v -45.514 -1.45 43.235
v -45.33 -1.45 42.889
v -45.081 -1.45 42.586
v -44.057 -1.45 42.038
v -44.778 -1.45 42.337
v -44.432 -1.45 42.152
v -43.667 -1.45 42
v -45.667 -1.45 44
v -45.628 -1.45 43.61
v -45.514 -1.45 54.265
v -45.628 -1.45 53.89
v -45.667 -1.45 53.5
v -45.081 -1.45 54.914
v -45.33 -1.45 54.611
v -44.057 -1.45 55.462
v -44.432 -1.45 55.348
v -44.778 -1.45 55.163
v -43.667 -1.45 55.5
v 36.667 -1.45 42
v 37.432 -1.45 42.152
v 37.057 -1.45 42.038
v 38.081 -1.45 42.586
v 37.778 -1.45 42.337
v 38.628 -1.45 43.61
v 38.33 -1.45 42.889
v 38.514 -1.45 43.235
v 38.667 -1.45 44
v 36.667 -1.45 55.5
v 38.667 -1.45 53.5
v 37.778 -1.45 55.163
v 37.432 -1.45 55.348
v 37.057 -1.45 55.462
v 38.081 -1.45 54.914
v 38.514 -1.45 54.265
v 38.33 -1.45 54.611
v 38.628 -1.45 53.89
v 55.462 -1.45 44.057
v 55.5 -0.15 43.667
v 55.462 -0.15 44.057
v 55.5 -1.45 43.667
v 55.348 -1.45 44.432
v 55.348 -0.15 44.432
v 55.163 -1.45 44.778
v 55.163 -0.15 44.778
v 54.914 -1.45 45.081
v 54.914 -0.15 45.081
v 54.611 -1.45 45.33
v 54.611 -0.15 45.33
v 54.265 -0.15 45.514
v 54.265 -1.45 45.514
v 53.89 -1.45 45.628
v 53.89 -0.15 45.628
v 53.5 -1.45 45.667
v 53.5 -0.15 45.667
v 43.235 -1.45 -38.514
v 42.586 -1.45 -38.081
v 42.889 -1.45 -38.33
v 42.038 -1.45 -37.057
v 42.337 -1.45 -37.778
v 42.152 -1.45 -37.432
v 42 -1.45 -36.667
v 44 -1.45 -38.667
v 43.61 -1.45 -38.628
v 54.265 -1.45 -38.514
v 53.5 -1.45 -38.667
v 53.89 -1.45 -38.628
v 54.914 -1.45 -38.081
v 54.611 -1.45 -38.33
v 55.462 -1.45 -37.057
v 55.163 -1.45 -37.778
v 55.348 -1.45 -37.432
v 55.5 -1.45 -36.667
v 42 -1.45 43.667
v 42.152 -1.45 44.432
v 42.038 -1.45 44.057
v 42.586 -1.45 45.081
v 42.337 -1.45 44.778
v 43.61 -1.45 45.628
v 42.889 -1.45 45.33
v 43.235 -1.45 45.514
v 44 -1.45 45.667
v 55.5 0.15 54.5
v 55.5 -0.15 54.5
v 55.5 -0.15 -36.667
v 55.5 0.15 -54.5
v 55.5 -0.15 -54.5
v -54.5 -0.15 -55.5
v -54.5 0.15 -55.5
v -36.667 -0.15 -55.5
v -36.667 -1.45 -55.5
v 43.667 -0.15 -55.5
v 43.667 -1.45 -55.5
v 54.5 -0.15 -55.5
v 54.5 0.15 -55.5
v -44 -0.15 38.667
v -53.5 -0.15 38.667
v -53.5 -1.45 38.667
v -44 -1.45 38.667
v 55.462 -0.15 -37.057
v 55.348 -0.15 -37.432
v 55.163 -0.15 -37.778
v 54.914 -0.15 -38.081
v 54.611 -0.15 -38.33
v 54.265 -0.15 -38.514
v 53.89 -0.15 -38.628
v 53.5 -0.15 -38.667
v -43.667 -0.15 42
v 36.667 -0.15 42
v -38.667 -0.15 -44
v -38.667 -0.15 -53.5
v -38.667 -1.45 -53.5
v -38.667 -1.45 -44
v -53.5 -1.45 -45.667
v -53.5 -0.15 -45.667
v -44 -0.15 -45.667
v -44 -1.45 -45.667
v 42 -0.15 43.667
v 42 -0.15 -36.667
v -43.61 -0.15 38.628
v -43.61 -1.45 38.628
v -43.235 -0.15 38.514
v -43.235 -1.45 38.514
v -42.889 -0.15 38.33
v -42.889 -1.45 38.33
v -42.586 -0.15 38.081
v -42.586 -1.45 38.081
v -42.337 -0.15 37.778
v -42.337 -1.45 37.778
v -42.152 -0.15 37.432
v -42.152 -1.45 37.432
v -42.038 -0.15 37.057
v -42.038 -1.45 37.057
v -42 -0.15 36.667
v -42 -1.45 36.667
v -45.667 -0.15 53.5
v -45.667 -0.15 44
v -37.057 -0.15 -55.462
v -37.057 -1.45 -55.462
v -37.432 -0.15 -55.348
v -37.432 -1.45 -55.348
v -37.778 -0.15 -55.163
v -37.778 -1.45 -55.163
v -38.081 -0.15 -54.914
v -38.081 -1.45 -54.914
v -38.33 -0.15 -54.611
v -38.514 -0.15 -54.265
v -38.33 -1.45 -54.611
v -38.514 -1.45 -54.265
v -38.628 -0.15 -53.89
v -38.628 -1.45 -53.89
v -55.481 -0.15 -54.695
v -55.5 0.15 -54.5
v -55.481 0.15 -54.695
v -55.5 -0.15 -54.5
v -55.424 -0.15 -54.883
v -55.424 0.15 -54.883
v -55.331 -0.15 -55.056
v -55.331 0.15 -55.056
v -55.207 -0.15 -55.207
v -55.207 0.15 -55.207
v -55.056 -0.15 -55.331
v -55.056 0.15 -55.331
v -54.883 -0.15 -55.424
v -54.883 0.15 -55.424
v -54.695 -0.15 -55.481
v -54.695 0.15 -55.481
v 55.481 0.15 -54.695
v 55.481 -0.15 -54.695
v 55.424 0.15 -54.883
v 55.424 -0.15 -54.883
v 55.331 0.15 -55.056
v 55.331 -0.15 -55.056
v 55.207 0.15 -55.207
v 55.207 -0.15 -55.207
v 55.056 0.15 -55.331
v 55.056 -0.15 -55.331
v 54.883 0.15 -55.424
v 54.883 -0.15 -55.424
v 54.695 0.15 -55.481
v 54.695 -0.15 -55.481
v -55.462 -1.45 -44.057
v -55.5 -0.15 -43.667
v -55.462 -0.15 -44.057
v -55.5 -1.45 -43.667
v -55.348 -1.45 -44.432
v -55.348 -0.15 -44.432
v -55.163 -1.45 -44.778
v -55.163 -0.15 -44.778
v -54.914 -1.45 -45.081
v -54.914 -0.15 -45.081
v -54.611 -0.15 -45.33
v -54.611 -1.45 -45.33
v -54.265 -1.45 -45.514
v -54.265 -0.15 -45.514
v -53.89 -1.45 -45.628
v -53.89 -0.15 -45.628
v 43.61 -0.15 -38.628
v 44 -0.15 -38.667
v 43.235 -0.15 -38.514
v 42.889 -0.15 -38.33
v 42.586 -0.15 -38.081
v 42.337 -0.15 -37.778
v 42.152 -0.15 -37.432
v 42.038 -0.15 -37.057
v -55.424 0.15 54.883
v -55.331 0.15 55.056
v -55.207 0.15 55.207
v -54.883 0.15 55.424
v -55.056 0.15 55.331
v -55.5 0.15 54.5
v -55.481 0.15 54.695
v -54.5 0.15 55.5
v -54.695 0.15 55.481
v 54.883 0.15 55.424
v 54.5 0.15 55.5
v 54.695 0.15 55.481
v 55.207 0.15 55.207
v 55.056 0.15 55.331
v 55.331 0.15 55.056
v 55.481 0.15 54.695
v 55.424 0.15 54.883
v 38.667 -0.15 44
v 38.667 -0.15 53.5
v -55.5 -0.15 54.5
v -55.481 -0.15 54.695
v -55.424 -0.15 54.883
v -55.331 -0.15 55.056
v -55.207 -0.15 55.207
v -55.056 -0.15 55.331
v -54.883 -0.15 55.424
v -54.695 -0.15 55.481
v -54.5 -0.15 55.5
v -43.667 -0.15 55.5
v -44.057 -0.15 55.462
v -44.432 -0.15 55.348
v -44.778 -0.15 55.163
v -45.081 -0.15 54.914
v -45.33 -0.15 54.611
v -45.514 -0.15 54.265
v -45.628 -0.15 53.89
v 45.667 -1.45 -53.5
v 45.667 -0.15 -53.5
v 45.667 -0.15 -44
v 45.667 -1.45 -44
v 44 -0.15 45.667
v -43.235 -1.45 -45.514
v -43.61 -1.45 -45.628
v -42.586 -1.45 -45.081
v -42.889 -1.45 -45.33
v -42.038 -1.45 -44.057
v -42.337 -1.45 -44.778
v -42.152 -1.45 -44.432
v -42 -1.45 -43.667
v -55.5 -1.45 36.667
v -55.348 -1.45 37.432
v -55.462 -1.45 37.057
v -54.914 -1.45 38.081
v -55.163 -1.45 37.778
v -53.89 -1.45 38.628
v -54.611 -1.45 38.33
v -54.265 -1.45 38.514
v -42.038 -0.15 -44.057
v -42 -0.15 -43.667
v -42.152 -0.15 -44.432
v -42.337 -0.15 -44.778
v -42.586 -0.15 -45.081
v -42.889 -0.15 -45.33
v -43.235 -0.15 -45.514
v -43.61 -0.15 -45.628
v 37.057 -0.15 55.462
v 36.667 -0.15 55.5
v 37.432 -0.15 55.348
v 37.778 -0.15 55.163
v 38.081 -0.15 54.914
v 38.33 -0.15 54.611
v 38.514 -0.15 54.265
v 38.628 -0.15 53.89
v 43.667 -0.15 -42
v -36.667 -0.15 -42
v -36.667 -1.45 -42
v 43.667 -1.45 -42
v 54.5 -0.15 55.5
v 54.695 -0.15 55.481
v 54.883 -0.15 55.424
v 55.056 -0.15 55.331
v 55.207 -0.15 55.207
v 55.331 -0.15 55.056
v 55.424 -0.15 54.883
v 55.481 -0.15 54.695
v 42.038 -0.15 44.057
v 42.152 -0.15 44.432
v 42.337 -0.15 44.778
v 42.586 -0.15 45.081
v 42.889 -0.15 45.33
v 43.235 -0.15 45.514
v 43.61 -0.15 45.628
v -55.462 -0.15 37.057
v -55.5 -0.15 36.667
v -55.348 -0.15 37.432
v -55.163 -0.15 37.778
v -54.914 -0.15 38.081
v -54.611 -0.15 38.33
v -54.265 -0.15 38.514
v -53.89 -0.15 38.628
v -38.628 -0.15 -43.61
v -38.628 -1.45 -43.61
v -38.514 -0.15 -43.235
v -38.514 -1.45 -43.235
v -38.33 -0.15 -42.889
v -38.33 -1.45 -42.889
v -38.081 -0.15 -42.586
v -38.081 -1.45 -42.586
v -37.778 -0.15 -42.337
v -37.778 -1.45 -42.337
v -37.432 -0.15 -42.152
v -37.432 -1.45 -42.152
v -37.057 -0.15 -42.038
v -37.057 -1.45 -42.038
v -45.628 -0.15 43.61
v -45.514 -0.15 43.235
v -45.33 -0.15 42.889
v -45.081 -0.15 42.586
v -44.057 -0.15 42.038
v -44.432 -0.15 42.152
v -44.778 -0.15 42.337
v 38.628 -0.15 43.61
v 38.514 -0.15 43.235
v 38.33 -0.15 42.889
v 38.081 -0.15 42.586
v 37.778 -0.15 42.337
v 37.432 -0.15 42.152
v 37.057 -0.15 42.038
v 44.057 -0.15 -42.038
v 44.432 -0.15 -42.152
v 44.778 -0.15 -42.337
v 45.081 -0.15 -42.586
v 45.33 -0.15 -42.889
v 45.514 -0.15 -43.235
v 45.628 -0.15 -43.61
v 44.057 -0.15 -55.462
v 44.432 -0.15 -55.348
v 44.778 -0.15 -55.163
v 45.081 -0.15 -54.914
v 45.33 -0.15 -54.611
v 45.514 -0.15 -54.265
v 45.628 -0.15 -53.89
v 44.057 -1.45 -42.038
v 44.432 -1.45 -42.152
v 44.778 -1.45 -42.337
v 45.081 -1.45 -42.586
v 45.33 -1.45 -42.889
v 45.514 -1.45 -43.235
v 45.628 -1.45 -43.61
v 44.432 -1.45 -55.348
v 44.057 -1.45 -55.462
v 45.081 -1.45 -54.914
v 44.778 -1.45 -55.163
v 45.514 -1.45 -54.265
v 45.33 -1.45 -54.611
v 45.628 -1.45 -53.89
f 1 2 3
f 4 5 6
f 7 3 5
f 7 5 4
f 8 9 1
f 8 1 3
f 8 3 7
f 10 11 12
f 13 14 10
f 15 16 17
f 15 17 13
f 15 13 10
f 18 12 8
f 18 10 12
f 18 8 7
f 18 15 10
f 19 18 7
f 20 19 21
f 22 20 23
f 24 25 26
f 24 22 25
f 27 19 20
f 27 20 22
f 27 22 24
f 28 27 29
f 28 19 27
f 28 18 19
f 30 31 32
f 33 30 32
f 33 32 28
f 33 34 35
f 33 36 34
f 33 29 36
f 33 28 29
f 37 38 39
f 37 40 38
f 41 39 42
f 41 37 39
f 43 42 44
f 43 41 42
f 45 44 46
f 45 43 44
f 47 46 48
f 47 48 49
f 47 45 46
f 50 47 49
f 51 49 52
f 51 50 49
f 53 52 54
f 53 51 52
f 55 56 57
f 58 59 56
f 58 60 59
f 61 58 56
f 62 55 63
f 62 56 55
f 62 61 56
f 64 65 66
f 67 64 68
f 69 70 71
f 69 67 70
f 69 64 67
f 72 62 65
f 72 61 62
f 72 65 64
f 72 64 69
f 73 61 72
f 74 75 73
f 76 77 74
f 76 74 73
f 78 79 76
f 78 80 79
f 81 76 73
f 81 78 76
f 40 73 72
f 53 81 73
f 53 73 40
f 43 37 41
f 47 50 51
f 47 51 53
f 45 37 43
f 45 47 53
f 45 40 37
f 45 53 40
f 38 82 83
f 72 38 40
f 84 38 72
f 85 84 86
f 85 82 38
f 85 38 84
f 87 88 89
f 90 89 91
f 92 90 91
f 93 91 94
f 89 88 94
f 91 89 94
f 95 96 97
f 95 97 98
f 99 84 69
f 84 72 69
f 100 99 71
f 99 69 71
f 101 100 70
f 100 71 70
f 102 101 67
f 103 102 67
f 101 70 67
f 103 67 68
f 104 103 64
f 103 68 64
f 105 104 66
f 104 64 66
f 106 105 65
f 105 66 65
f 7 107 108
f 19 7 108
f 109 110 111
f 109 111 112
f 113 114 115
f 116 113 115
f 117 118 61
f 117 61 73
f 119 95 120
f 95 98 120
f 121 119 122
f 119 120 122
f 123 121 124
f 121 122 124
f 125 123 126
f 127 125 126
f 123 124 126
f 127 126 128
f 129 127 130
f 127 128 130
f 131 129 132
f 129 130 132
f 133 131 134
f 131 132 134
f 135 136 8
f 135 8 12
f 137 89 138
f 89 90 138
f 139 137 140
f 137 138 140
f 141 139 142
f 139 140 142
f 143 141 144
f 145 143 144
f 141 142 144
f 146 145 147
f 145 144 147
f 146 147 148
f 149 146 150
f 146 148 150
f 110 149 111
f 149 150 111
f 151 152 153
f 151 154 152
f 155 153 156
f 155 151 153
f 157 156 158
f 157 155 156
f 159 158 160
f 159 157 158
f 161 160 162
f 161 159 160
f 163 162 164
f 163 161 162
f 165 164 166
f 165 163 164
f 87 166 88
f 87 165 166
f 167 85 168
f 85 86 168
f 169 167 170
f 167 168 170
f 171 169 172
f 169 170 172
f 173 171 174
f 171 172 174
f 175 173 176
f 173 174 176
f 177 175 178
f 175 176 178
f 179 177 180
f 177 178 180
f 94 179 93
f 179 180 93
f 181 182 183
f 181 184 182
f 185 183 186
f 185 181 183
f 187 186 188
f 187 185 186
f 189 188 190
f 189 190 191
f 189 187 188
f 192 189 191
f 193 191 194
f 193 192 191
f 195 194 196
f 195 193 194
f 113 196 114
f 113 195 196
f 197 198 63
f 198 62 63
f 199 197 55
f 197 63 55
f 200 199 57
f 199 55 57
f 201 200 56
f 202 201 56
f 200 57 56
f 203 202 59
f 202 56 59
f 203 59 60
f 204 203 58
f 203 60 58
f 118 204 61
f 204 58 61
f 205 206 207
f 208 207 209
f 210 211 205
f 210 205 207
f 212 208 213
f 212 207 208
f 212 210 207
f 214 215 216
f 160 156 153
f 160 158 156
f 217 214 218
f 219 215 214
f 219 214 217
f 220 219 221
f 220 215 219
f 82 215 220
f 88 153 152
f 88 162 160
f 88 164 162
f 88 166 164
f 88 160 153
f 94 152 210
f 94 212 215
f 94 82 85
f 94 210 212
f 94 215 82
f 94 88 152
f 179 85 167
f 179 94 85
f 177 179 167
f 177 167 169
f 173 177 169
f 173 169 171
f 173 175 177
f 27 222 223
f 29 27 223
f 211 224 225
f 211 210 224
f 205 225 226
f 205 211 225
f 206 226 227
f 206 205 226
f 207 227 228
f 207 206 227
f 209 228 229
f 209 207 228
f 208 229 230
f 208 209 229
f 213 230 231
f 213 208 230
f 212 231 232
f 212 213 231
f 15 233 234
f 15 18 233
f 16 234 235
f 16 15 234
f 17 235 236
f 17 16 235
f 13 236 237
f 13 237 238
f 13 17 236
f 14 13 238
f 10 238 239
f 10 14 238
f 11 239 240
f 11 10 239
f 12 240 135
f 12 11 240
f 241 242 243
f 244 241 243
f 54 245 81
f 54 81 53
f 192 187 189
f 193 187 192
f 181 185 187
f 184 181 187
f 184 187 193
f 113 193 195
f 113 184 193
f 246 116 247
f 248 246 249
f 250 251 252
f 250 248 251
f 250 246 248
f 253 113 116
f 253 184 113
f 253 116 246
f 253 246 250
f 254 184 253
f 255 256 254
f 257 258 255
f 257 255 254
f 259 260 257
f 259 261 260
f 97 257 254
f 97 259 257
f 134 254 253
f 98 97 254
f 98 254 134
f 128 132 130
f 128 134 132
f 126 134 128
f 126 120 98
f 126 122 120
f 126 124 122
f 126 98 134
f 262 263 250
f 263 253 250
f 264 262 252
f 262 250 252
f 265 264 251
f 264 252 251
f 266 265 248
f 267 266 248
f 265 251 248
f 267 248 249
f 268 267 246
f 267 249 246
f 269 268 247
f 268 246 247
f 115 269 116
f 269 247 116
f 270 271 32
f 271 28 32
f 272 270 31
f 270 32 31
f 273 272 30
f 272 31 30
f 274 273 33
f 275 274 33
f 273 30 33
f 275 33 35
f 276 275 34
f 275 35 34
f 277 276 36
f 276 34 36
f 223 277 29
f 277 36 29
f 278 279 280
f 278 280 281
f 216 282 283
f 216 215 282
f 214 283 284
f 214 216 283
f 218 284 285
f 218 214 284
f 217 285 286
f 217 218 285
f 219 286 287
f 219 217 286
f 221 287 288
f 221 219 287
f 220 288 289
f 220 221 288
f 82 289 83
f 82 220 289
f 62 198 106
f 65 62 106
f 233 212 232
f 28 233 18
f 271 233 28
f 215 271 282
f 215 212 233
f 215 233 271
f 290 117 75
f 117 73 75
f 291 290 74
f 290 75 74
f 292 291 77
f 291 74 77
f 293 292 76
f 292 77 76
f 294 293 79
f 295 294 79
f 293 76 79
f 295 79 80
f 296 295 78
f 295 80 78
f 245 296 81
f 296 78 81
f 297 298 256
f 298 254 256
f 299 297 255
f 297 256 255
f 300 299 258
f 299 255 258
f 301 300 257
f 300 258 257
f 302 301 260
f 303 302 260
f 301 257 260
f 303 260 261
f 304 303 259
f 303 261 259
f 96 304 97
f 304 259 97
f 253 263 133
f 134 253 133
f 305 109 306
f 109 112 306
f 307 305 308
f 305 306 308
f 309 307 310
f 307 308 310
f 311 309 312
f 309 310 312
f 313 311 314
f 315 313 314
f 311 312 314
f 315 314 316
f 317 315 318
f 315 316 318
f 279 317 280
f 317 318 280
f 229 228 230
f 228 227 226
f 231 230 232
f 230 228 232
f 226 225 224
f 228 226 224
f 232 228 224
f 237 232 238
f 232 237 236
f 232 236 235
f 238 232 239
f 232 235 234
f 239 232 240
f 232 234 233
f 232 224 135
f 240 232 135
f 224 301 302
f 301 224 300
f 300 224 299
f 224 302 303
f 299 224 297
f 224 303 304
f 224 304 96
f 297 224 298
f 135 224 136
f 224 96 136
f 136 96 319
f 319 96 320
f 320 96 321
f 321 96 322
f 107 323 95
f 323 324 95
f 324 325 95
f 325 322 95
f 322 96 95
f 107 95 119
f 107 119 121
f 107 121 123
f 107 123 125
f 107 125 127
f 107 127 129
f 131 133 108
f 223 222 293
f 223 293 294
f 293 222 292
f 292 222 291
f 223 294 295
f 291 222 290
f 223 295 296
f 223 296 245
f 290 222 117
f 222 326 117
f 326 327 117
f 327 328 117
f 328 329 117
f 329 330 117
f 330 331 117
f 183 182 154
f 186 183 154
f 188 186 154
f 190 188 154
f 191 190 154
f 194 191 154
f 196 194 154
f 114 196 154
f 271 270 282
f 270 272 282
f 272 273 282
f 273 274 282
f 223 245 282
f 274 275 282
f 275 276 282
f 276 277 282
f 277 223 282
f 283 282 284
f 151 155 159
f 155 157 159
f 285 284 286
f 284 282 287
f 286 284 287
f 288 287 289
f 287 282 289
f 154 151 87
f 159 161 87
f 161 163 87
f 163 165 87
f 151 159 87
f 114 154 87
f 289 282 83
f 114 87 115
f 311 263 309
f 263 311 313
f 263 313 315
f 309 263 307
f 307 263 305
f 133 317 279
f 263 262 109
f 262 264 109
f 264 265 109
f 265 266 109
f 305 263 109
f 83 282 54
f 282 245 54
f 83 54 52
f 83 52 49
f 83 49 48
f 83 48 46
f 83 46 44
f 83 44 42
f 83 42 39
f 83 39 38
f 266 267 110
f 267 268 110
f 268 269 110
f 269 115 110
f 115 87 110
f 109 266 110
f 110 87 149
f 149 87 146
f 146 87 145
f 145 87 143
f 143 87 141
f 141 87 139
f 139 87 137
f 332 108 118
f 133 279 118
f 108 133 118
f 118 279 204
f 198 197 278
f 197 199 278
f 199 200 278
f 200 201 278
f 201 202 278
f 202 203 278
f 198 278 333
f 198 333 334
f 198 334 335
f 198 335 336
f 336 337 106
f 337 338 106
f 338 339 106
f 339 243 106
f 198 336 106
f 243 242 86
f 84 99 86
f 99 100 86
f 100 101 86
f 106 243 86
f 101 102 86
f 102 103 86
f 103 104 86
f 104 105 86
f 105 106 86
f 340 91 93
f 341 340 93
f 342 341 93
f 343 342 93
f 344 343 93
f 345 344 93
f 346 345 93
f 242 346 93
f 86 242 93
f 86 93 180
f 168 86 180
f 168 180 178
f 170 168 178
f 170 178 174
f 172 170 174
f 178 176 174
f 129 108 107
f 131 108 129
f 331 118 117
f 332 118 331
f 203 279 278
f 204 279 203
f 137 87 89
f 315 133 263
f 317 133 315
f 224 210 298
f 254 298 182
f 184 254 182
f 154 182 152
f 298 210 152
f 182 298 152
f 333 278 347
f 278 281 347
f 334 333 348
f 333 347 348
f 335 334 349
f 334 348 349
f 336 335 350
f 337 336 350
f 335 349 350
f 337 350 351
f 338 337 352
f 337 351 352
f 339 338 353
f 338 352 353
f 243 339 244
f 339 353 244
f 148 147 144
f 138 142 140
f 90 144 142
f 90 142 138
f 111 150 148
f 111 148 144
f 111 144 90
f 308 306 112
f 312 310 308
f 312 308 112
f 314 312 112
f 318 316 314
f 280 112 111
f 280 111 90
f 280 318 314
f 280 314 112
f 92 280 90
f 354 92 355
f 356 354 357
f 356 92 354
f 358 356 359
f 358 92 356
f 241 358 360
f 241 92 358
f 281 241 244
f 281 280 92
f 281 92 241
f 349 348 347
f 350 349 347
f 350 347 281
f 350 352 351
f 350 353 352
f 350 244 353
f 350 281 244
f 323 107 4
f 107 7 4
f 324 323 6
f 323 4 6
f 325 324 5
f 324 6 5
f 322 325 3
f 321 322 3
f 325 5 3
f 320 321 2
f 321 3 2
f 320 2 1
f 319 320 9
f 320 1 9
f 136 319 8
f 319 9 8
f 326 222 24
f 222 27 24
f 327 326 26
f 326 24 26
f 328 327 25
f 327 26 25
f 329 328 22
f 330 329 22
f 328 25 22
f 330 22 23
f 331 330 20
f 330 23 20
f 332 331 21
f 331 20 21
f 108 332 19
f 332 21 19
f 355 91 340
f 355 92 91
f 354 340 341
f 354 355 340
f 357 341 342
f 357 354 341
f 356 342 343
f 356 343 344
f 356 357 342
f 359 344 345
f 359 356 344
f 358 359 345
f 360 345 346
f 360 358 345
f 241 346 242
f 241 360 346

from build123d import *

# Parameters (mm, degrees)
SKETCH1_W           = 111
SKETCH1_H           = 111
BOSS_EXTRUDE1_DEPTH = 0.15
SKETCH2_W           = 13.5
SKETCH2_H           = 84.333333334
SKETCH2_W_2         = 84.333333334
SKETCH2_H_2         = 13.5
BOSS_EXTRUDE2_DEPTH = 1.3
FILLET1_R           = 2
FILLET2_R           = 1


with BuildPart() as part:
    # Sketch1 → Boss-Extrude1 (new, symmetric)
    with BuildSketch(Plane(origin=(0, 0, 0), x_dir=(1, 0, 0), z_dir=(0, 1, 0))):
        Rectangle(SKETCH1_W, SKETCH1_H)
    extrude(amount=BOSS_EXTRUDE1_DEPTH, both=True)

    # Sketch2 → Boss-Extrude2 (add)
    with BuildSketch(Plane.XZ.offset(0.15)):
        with Locations((-48.75, -3.5)):
            Rectangle(SKETCH2_W, SKETCH2_H)
        with Locations((3.5, -48.75)):
            Rectangle(SKETCH2_W_2, SKETCH2_H_2)
        with Locations((-3.5, 48.75)):
            Rectangle(SKETCH2_W_2, SKETCH2_H_2)
        with Locations((48.75, 3.5)):
            Rectangle(SKETCH2_W, SKETCH2_H)
    extrude(amount=BOSS_EXTRUDE2_DEPTH)

    # Fillet1
    fillet1_edges = [part.edges().sort_by_distance(p)[0] for p in [
        (45.666666667, -0.8, -55.5),
        (45.666666667, -0.8, -42),
        (-38.666666667, -0.8, -42),
        (-38.666666667, -0.8, -55.5),
        (-42, -0.8, -45.666666667),
        (-42, -0.8, 38.666666667),
        (-55.5, -0.8, 38.666666667),
        (-55.5, -0.8, -45.666666667),
        (-45.666666667, -0.8, 42),
        (38.666666667, -0.8, 42),
        (38.666666667, -0.8, 55.5),
        (-45.666666667, -0.8, 55.5),
        (42, -0.8, 45.666666667),
        (42, -0.8, -38.666666667),
        (55.5, -0.8, -38.666666667),
        (55.5, -0.8, 45.666666667),
    ]]
    fillet(fillet1_edges, radius=FILLET1_R)

    # Fillet2
    fillet2_edges = [part.edges().sort_by_distance(p)[0] for p in [
        (55.5, 0, 55.5),
        (-55.5, 0, 55.5),
        (-55.5, 0, -55.5),
        (55.5, 0, -55.5),
    ]]
    fillet(fillet2_edges, radius=FILLET2_R)


solid = part.part
